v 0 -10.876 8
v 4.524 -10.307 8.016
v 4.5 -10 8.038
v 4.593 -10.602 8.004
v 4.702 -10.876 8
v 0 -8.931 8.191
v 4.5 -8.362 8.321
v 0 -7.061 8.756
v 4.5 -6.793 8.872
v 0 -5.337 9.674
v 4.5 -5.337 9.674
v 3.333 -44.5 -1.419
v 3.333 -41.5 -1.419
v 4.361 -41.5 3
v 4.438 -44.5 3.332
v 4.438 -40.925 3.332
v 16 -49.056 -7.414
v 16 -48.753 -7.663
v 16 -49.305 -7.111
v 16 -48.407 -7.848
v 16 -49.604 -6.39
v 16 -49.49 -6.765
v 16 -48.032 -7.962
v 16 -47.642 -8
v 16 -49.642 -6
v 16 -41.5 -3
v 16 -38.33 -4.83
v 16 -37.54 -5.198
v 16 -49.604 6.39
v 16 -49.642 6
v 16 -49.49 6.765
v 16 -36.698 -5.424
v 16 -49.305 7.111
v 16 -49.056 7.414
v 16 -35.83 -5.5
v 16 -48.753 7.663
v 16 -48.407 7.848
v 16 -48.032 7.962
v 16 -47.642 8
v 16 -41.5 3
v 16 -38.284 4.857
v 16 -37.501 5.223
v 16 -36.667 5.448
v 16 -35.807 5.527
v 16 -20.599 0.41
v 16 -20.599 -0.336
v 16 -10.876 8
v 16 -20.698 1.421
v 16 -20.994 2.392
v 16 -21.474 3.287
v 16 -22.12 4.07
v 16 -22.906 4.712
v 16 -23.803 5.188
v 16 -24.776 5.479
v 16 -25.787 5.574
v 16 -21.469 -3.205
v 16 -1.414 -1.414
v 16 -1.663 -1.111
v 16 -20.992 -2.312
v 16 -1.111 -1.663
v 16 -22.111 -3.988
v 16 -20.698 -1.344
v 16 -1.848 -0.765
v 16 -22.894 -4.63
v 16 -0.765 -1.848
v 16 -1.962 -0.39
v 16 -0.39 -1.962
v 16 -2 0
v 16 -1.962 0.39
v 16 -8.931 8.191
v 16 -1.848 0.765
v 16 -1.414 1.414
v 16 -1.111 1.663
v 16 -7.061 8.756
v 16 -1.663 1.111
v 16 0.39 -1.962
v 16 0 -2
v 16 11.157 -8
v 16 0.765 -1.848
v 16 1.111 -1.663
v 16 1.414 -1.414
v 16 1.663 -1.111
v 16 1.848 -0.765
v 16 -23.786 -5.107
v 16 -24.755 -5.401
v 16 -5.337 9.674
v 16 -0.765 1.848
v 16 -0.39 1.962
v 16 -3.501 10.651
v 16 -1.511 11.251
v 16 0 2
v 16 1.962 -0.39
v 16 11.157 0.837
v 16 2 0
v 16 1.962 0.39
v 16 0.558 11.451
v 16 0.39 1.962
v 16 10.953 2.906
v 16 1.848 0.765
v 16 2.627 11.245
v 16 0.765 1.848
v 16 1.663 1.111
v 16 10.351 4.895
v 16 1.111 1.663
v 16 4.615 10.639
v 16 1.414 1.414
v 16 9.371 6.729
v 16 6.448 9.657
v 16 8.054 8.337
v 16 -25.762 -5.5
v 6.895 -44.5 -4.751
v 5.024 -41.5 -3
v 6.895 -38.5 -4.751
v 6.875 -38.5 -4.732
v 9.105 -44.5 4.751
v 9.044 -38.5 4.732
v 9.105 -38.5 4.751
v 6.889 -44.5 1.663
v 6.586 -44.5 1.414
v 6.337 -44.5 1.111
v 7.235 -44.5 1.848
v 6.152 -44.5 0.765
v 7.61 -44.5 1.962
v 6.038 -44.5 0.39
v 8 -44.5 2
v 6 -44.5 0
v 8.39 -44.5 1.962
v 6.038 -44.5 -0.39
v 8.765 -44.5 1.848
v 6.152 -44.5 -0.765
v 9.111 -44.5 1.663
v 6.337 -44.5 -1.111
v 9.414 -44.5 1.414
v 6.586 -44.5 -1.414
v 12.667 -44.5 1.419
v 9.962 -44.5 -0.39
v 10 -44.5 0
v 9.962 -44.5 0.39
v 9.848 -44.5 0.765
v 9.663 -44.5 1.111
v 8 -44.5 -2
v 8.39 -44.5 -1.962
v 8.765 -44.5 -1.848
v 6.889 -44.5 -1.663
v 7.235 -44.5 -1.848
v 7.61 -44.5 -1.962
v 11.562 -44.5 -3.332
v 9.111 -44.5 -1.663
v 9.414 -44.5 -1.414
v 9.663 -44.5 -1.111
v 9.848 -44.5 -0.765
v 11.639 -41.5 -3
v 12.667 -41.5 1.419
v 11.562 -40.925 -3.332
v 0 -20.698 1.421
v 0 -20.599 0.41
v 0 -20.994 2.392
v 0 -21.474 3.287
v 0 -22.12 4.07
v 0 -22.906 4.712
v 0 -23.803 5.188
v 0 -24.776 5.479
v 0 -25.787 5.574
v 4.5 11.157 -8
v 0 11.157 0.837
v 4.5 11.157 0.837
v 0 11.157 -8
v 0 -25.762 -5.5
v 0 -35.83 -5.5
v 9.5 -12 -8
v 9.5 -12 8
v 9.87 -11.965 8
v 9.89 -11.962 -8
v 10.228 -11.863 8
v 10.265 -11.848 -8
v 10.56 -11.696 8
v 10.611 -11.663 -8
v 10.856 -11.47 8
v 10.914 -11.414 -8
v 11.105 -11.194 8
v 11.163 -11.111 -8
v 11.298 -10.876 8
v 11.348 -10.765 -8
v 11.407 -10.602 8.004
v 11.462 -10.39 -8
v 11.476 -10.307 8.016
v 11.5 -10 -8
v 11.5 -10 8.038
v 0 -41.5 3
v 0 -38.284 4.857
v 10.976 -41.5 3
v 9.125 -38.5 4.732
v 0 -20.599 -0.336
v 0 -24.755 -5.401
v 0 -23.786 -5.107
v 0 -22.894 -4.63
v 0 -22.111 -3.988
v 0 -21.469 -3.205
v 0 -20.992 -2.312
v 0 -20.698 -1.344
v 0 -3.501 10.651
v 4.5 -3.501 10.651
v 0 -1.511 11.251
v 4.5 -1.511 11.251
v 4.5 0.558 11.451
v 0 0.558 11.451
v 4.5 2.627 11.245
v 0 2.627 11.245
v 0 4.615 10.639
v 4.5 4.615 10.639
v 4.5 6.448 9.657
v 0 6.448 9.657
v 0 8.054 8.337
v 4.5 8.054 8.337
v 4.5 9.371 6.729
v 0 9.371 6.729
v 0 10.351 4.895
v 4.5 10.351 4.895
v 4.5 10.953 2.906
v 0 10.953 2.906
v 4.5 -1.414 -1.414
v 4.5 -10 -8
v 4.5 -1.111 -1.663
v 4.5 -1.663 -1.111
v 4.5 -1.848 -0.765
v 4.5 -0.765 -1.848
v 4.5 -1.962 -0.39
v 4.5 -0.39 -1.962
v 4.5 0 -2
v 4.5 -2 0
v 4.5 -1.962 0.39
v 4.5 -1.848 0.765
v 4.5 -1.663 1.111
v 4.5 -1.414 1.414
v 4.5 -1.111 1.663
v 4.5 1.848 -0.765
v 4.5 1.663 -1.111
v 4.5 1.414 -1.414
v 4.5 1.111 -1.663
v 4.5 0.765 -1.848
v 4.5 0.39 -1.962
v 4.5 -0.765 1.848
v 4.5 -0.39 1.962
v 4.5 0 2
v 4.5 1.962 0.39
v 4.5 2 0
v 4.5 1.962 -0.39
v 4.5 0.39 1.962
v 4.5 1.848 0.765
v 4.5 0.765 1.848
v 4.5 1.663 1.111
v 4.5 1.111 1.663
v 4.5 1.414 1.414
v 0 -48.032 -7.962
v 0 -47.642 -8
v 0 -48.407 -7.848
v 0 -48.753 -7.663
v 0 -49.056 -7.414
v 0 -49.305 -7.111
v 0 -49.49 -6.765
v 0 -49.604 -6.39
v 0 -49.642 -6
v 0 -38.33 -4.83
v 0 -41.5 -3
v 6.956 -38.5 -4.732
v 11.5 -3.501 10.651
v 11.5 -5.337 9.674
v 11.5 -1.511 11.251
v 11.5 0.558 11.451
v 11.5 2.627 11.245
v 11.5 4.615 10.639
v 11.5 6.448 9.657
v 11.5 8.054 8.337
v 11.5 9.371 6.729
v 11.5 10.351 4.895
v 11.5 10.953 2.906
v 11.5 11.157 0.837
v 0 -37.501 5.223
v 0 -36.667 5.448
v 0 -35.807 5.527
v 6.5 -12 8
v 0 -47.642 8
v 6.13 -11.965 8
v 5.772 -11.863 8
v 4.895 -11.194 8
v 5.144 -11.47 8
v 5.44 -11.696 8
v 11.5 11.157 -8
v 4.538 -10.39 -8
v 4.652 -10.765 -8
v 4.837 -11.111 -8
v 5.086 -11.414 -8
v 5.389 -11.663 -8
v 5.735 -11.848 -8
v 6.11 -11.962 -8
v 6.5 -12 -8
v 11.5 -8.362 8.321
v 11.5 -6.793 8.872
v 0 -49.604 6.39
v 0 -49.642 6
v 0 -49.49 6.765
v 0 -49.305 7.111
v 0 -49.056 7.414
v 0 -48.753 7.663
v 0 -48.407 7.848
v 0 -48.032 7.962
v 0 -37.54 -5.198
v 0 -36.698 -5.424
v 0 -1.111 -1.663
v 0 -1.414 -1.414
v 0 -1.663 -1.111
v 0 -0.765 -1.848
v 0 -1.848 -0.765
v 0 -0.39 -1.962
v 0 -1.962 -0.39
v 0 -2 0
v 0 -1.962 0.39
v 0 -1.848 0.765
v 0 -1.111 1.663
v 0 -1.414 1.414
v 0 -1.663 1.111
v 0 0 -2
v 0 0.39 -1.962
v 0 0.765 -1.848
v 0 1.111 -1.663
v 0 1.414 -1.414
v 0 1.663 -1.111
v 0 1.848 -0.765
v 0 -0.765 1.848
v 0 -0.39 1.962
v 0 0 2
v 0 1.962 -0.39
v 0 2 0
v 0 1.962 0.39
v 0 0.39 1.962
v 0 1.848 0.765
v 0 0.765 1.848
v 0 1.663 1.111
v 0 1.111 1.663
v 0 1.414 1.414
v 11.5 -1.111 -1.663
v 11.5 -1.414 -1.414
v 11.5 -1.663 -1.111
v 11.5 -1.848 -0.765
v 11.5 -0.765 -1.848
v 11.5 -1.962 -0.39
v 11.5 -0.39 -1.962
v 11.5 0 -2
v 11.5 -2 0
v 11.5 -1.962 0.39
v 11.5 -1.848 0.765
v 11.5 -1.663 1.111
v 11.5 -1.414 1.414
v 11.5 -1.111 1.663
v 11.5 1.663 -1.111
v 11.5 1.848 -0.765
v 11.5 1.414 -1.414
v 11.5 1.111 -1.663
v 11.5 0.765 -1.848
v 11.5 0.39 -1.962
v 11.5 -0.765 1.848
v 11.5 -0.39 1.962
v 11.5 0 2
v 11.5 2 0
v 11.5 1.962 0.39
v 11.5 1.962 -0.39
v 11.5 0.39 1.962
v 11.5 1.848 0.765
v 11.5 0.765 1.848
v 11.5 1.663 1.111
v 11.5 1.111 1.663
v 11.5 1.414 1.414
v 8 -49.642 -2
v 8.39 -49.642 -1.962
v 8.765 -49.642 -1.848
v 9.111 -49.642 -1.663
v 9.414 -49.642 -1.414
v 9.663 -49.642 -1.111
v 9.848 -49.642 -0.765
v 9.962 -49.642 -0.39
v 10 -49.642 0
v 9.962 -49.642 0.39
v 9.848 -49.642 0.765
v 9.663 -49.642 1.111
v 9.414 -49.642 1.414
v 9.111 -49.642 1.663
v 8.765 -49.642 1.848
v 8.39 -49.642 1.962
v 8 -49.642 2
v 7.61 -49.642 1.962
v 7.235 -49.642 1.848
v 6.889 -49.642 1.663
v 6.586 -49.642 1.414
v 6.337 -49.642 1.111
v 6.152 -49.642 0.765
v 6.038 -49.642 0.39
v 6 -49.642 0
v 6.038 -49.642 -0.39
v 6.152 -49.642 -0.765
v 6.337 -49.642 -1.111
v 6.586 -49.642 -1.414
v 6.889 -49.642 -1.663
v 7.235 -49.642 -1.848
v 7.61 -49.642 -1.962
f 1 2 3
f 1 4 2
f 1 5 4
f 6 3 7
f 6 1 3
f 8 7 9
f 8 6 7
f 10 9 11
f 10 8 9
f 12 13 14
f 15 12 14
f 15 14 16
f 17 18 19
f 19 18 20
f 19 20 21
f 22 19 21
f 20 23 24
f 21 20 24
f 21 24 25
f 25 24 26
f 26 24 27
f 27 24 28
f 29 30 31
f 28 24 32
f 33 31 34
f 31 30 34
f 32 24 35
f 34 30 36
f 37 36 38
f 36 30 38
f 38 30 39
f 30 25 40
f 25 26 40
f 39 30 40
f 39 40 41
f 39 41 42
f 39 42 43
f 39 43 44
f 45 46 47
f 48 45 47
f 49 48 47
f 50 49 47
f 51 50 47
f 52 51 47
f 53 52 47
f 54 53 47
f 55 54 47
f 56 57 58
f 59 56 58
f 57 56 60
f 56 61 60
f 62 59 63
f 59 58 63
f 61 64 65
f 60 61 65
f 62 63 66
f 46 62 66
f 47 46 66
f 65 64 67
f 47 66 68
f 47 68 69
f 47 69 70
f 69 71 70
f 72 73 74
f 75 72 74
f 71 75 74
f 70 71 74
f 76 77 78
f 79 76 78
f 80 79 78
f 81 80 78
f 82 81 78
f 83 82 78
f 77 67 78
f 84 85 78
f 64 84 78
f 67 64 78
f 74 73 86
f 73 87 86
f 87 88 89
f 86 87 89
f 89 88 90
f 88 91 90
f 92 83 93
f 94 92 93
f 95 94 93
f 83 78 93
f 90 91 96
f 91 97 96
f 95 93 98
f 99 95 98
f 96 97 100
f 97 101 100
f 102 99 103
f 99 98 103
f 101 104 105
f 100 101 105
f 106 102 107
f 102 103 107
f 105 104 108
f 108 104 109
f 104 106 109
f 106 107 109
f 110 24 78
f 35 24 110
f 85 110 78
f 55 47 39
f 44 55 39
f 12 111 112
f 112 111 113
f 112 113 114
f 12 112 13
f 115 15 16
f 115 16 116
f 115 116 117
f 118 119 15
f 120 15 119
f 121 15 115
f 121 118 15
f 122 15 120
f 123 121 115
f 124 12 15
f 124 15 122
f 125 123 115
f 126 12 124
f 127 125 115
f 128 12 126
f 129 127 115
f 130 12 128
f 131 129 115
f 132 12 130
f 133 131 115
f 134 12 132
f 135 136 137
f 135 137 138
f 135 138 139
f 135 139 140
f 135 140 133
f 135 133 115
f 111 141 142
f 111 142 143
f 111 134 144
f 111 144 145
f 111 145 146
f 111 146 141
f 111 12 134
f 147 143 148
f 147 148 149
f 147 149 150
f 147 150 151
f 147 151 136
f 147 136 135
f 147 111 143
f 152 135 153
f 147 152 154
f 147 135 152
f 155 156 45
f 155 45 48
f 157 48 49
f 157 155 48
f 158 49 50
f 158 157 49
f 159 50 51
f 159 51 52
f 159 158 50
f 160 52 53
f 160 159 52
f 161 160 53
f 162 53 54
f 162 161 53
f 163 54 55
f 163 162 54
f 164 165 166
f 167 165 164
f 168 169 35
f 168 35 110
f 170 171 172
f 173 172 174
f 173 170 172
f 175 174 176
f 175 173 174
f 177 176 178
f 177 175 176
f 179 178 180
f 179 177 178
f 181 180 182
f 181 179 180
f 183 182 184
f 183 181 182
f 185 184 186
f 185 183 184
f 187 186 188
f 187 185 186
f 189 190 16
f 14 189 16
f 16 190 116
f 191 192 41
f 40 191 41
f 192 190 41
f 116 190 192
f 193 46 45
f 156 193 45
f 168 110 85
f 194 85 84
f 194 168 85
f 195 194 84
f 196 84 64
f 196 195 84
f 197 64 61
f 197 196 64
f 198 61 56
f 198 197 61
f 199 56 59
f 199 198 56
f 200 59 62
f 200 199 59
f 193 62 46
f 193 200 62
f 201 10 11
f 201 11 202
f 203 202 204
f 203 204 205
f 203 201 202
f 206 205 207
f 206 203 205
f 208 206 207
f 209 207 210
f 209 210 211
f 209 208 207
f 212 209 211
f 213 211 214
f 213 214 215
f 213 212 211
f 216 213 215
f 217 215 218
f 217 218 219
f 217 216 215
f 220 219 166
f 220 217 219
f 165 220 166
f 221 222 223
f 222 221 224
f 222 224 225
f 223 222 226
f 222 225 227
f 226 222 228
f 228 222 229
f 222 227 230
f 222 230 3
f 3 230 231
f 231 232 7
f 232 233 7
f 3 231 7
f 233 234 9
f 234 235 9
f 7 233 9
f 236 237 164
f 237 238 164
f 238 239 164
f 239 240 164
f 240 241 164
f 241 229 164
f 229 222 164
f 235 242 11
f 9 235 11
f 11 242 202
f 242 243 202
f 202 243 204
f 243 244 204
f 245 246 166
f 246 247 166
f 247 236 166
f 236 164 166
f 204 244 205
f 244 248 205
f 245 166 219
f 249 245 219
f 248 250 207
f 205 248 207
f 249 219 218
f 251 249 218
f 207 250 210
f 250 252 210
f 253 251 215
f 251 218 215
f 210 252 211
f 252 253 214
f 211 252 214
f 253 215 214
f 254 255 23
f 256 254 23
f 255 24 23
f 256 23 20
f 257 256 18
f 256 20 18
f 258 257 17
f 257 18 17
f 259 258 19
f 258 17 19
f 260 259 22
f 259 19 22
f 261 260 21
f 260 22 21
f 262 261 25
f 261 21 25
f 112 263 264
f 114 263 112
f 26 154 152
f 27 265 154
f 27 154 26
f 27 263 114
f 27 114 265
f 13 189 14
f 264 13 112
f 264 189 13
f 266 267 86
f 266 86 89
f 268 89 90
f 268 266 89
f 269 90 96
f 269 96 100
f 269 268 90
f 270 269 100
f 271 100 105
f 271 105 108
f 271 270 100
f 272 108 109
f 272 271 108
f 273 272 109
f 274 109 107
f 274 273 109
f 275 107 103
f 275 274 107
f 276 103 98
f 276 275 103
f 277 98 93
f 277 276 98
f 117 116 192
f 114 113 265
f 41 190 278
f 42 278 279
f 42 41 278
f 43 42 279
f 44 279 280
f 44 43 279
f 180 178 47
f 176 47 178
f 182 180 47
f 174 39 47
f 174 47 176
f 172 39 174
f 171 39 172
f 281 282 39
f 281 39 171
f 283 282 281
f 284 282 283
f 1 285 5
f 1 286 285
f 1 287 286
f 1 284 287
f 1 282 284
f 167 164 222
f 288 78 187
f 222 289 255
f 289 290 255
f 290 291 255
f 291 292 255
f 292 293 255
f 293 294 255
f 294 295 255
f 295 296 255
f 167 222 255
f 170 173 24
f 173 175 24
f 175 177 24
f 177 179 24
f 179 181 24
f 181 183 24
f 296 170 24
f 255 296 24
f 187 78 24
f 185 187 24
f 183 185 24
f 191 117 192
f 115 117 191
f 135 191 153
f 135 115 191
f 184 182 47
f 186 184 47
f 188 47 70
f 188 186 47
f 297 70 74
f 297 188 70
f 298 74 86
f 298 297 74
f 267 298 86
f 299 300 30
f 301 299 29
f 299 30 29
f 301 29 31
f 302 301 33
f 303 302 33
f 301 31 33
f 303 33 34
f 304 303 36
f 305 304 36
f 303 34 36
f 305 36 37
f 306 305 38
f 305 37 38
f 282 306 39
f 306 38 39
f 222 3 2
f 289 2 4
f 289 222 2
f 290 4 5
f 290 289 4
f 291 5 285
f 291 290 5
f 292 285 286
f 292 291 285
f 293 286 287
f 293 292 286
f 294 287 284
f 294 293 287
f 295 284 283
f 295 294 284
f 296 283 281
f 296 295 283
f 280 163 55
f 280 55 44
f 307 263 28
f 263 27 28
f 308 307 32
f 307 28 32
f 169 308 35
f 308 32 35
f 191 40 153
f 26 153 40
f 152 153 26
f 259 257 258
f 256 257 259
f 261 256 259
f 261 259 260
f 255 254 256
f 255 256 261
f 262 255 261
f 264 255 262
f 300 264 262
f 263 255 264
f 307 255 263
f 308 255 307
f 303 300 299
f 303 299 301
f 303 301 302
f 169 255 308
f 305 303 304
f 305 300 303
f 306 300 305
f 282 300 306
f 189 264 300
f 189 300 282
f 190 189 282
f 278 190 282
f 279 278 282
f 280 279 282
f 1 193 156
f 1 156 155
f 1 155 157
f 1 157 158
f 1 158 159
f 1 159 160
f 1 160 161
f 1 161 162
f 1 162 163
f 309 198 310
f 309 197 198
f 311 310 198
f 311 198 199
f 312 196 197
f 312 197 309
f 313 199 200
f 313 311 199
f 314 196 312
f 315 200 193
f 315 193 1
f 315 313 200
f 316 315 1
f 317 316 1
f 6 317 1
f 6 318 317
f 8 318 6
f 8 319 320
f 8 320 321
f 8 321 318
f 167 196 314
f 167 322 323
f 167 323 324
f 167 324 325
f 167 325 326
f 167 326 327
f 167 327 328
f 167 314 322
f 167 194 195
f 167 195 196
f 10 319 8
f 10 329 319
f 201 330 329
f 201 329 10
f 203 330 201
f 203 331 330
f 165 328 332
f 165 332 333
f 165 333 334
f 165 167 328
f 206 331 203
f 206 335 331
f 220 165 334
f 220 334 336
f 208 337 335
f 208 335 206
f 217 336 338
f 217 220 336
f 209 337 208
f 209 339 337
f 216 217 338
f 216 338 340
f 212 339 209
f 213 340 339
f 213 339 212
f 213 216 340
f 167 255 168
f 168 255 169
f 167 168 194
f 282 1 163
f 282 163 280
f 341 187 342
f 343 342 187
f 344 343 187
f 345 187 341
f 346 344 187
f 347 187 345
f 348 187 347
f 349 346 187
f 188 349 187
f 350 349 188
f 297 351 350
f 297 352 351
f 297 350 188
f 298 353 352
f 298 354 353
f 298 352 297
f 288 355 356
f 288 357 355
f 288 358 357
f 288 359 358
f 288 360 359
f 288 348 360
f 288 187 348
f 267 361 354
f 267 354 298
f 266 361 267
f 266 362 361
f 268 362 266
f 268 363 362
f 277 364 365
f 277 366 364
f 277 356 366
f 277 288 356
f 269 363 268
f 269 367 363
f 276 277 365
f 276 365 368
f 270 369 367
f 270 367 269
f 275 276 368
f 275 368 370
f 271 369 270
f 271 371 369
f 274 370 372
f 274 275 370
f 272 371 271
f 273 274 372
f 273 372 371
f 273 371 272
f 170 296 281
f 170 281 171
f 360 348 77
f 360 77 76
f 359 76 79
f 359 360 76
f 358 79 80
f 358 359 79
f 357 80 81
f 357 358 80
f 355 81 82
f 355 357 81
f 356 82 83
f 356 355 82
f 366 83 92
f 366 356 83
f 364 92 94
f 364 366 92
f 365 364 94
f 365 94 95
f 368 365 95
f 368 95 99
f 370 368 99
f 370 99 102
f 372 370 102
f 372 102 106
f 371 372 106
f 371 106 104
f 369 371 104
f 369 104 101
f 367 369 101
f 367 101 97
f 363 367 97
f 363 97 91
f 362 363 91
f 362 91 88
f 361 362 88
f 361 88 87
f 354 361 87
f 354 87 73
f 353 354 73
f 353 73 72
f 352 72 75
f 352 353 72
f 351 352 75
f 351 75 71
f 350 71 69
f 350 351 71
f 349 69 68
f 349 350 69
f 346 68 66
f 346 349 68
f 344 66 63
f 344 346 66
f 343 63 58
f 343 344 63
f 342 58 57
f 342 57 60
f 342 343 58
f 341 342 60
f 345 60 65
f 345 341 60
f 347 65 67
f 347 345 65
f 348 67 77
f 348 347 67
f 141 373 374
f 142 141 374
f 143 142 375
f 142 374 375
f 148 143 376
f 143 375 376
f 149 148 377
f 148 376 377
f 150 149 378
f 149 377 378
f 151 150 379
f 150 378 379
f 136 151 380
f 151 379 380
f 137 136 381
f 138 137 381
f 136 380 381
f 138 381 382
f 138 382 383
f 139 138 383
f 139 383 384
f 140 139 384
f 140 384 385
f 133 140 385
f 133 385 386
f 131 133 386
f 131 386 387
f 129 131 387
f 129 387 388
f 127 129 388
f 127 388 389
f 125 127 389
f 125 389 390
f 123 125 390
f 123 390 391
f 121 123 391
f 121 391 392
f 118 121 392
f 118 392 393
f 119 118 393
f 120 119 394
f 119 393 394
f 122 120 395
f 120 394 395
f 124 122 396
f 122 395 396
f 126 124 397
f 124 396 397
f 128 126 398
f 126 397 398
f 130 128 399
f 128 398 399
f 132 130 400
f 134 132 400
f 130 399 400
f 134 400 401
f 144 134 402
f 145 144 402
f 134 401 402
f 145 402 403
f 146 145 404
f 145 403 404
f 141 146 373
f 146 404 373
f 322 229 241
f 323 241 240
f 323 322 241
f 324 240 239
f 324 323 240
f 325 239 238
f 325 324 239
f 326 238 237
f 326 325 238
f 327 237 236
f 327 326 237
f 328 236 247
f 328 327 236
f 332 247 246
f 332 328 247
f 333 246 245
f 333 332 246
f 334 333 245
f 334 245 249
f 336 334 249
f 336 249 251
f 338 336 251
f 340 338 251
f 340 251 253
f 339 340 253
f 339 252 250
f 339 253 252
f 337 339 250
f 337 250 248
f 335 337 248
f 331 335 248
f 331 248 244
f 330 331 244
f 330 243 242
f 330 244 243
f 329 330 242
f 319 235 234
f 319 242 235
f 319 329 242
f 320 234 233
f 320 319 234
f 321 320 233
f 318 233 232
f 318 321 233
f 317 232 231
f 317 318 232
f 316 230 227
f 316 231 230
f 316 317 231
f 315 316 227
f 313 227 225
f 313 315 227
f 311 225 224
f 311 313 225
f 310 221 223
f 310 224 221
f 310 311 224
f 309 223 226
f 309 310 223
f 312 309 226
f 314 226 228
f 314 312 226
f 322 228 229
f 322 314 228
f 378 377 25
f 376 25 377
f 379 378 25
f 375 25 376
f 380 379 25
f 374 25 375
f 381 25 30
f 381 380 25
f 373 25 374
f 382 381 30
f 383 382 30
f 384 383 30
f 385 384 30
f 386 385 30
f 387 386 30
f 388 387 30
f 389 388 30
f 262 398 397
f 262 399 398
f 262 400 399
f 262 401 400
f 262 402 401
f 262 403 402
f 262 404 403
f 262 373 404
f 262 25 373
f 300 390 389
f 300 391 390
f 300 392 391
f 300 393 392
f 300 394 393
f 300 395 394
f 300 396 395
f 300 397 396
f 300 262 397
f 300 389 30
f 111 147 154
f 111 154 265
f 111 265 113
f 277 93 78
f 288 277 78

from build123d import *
from OCP.BRepFilletAPI import BRepFilletAPI_MakeChamfer

# Parameters (mm, degrees)
SKETCH9_R                    = 2
BOSS_EXTRUDE3_DEPTH          = 16
SKETCH10_R                   = 2
CUT_EXTRUDE7_DEPTH           = 14
SKETCH11_W                   = 7
SKETCH11_H                   = 26.686138344
CUT_EXTRUDE8_DEPTH           = 28
FILLET1_R                    = 2
CHAMFER1_SIZE                = 2.5
CHAMFER1_SIZE2               = 4.365846821
CHAMFER1_SIZE2_2             = 4.330127019
EXTRUDE1_DEPTH               = 3
EXTRUDE1_DEPTH_BACK          = 3
FILLET2_R                    = 2
FILLET3_R                    = 5
ESTRUSIONE_ESTRUSIONE1_DEPTH = 4.5
ESTRUSIONE_ESTRUSIONE2_DEPTH = 4.5


with BuildPart() as part:
    # Sketch9 → Boss-Extrude3 (new body)
    with BuildSketch(Plane(origin=(0, 0, 0), x_dir=(0, 0, -1), z_dir=(1, 0, 0))):
        with BuildLine():
            Line((8, 5.053889445), (8, -49.642014822))
            Line((8, -49.642014822), (-8, -49.642014822))
            Line((-8, -49.642014822), (-8, -10.875806049))
            ThreePointArc((-8, -10.875806049), (-8.427714838, -7.982476346), (-9.674271354, -5.336650652))
            ThreePointArc((-9.674271354, -5.336650652), (-7.418447874, 8.870328147), (6.925281884, 7.78202542))
            ThreePointArc((6.925281884, 7.78202542), (7.721634556, 6.519985019), (8, 5.053889445))
        make_face()
        Circle(SKETCH9_R, mode=Mode.SUBTRACT)
        with BuildLine():
            Line((5.5, -41.5), (5.5, -25.762364524))
            ThreePointArc((5.5, -25.762364524), (3.987567872, -22.111030369), (0.336233717, -20.598598241))
            Line((0.336233717, -20.598598241), (-0.410415455, -20.598598241))
            ThreePointArc((-0.410415455, -20.598598241), (-4.070351606, -22.119652678), (-5.574124284, -25.786723302))
            Line((-5.574124284, -25.786723302), (-5.5, -41.5))
            Line((-5.5, -41.5), (5.5, -41.5))
        make_face(mode=Mode.SUBTRACT)
    extrude(amount=BOSS_EXTRUDE3_DEPTH)

    # Sketch10 → Cut-Extrude7 (cut)
    with BuildSketch(Plane.XZ.offset(49.642014822)):
        with Locations(Location((8, 0, 0), (0, 0, 270))):
            Circle(SKETCH10_R)
    extrude(amount=-CUT_EXTRUDE7_DEPTH, mode=Mode.SUBTRACT)

    # Sketch11 → Cut-Extrude8 (cut)
    with BuildSketch(Plane(origin=(0, 16, 0), x_dir=(1, 0, 0), z_dir=(0, 1, 0))):
        with Locations((8, -2.737831409)):
            Rectangle(SKETCH11_W, SKETCH11_H)
    extrude(amount=-CUT_EXTRUDE8_DEPTH, mode=Mode.SUBTRACT)

    # Fillet1
    fillet1_edges = [part.edges().sort_by_distance(p)[0] for p in [
        (8, -49.642014822, 8),
        (8, -49.642014822, -8),
    ]]
    fillet(fillet1_edges, radius=FILLET1_R)

    # Chamfer1: one chamfer whose edges measure the first distance from different faces: ONE call of the kernel's chamfer builder (chamfer() names one face for all edges)
    chamfer1_edges_1 = [part.edges().sort_by_distance(p)[0] for p in [
        (8, -41.5, 5.5),
    ]]
    chamfer1_side_1 = [part.faces().sort_by_distance(p)[0] for p in [
        (8, -41.5, 5.305835122),
    ]]
    chamfer1_edges_2 = [part.edges().sort_by_distance(p)[0] for p in [
        (8, -41.5, -5.5),
    ]]
    chamfer1_side_2 = [part.faces().sort_by_distance(p)[0] for p in [
        (8, -41.5, 5.305835122),
    ]]
    chamfer1 = BRepFilletAPI_MakeChamfer(part.part.solid().wrapped)
    for e in chamfer1_edges_1:
        chamfer1.Add(CHAMFER1_SIZE, CHAMFER1_SIZE2, e.wrapped, chamfer1_side_1[0].wrapped)  # the first distance lies on this face
    for e in chamfer1_edges_2:
        chamfer1.Add(CHAMFER1_SIZE, CHAMFER1_SIZE2_2, e.wrapped, chamfer1_side_2[0].wrapped)  # the first distance lies on this face
    add(Compound.cast(chamfer1.Shape()), mode=Mode.REPLACE)

    # Sketch12 → Extrude1 (cut, two sides)
    with BuildSketch(Plane(origin=(0, -41.5, 0), x_dir=(1, 0, 0), z_dir=(0, 1, 0))) as extrude1_sk:
        Polygon((6.895214346, 4.750578313), (3.333485671, 1.418516714), (4.438271325, -3.332061599), (9.104785654, -4.750578313), (12.666514329, -1.418516714), (11.561728675, 3.332061599), align=None)
    extrude(amount=EXTRUDE1_DEPTH, mode=Mode.SUBTRACT)
    extrude(extrude1_sk.sketch, amount=-EXTRUDE1_DEPTH_BACK, mode=Mode.SUBTRACT)

    # Fillet2
    fillet2_edges = [part.edges().sort_by_distance(p)[0] for p in [
        (4.5, -12, 0),
        (11.5, -12, 0),
    ]]
    fillet(fillet2_edges, radius=FILLET2_R)

    # Fillet3
    fillet3_edges = [part.edges().sort_by_distance(p)[0] for p in [
        (8, -37.169872981, -5.5),
        (8, -37.134201755, 5.520594792),
    ]]
    fillet(fillet3_edges, radius=FILLET3_R)

    # Schizzo1 → Estrusione-Estrusione1 (add)
    with BuildSketch(Plane.ZY):
        Polygon((0.837135677, 11.156995776), (-8, 11.156995776), (-8, 4.232261394), (1.127037183, 4.232261394), align=None)
    extrude(amount=-ESTRUSIONE_ESTRUSIONE1_DEPTH)

    # Schizzo2 → Estrusione-Estrusione2 (add)
    with BuildSketch(Plane(origin=(16, 0, 0), x_dir=(0, 0, -1), z_dir=(1, 0, 0))):
        Polygon((-0.837135677, 11.156995776), (8, 11.156995776), (8, 3.955668155), (-3.77094248, 6.198951123), (-1.212549738, 11.150354711), align=None)
    extrude(amount=-ESTRUSIONE_ESTRUSIONE2_DEPTH)


solid = part.part
